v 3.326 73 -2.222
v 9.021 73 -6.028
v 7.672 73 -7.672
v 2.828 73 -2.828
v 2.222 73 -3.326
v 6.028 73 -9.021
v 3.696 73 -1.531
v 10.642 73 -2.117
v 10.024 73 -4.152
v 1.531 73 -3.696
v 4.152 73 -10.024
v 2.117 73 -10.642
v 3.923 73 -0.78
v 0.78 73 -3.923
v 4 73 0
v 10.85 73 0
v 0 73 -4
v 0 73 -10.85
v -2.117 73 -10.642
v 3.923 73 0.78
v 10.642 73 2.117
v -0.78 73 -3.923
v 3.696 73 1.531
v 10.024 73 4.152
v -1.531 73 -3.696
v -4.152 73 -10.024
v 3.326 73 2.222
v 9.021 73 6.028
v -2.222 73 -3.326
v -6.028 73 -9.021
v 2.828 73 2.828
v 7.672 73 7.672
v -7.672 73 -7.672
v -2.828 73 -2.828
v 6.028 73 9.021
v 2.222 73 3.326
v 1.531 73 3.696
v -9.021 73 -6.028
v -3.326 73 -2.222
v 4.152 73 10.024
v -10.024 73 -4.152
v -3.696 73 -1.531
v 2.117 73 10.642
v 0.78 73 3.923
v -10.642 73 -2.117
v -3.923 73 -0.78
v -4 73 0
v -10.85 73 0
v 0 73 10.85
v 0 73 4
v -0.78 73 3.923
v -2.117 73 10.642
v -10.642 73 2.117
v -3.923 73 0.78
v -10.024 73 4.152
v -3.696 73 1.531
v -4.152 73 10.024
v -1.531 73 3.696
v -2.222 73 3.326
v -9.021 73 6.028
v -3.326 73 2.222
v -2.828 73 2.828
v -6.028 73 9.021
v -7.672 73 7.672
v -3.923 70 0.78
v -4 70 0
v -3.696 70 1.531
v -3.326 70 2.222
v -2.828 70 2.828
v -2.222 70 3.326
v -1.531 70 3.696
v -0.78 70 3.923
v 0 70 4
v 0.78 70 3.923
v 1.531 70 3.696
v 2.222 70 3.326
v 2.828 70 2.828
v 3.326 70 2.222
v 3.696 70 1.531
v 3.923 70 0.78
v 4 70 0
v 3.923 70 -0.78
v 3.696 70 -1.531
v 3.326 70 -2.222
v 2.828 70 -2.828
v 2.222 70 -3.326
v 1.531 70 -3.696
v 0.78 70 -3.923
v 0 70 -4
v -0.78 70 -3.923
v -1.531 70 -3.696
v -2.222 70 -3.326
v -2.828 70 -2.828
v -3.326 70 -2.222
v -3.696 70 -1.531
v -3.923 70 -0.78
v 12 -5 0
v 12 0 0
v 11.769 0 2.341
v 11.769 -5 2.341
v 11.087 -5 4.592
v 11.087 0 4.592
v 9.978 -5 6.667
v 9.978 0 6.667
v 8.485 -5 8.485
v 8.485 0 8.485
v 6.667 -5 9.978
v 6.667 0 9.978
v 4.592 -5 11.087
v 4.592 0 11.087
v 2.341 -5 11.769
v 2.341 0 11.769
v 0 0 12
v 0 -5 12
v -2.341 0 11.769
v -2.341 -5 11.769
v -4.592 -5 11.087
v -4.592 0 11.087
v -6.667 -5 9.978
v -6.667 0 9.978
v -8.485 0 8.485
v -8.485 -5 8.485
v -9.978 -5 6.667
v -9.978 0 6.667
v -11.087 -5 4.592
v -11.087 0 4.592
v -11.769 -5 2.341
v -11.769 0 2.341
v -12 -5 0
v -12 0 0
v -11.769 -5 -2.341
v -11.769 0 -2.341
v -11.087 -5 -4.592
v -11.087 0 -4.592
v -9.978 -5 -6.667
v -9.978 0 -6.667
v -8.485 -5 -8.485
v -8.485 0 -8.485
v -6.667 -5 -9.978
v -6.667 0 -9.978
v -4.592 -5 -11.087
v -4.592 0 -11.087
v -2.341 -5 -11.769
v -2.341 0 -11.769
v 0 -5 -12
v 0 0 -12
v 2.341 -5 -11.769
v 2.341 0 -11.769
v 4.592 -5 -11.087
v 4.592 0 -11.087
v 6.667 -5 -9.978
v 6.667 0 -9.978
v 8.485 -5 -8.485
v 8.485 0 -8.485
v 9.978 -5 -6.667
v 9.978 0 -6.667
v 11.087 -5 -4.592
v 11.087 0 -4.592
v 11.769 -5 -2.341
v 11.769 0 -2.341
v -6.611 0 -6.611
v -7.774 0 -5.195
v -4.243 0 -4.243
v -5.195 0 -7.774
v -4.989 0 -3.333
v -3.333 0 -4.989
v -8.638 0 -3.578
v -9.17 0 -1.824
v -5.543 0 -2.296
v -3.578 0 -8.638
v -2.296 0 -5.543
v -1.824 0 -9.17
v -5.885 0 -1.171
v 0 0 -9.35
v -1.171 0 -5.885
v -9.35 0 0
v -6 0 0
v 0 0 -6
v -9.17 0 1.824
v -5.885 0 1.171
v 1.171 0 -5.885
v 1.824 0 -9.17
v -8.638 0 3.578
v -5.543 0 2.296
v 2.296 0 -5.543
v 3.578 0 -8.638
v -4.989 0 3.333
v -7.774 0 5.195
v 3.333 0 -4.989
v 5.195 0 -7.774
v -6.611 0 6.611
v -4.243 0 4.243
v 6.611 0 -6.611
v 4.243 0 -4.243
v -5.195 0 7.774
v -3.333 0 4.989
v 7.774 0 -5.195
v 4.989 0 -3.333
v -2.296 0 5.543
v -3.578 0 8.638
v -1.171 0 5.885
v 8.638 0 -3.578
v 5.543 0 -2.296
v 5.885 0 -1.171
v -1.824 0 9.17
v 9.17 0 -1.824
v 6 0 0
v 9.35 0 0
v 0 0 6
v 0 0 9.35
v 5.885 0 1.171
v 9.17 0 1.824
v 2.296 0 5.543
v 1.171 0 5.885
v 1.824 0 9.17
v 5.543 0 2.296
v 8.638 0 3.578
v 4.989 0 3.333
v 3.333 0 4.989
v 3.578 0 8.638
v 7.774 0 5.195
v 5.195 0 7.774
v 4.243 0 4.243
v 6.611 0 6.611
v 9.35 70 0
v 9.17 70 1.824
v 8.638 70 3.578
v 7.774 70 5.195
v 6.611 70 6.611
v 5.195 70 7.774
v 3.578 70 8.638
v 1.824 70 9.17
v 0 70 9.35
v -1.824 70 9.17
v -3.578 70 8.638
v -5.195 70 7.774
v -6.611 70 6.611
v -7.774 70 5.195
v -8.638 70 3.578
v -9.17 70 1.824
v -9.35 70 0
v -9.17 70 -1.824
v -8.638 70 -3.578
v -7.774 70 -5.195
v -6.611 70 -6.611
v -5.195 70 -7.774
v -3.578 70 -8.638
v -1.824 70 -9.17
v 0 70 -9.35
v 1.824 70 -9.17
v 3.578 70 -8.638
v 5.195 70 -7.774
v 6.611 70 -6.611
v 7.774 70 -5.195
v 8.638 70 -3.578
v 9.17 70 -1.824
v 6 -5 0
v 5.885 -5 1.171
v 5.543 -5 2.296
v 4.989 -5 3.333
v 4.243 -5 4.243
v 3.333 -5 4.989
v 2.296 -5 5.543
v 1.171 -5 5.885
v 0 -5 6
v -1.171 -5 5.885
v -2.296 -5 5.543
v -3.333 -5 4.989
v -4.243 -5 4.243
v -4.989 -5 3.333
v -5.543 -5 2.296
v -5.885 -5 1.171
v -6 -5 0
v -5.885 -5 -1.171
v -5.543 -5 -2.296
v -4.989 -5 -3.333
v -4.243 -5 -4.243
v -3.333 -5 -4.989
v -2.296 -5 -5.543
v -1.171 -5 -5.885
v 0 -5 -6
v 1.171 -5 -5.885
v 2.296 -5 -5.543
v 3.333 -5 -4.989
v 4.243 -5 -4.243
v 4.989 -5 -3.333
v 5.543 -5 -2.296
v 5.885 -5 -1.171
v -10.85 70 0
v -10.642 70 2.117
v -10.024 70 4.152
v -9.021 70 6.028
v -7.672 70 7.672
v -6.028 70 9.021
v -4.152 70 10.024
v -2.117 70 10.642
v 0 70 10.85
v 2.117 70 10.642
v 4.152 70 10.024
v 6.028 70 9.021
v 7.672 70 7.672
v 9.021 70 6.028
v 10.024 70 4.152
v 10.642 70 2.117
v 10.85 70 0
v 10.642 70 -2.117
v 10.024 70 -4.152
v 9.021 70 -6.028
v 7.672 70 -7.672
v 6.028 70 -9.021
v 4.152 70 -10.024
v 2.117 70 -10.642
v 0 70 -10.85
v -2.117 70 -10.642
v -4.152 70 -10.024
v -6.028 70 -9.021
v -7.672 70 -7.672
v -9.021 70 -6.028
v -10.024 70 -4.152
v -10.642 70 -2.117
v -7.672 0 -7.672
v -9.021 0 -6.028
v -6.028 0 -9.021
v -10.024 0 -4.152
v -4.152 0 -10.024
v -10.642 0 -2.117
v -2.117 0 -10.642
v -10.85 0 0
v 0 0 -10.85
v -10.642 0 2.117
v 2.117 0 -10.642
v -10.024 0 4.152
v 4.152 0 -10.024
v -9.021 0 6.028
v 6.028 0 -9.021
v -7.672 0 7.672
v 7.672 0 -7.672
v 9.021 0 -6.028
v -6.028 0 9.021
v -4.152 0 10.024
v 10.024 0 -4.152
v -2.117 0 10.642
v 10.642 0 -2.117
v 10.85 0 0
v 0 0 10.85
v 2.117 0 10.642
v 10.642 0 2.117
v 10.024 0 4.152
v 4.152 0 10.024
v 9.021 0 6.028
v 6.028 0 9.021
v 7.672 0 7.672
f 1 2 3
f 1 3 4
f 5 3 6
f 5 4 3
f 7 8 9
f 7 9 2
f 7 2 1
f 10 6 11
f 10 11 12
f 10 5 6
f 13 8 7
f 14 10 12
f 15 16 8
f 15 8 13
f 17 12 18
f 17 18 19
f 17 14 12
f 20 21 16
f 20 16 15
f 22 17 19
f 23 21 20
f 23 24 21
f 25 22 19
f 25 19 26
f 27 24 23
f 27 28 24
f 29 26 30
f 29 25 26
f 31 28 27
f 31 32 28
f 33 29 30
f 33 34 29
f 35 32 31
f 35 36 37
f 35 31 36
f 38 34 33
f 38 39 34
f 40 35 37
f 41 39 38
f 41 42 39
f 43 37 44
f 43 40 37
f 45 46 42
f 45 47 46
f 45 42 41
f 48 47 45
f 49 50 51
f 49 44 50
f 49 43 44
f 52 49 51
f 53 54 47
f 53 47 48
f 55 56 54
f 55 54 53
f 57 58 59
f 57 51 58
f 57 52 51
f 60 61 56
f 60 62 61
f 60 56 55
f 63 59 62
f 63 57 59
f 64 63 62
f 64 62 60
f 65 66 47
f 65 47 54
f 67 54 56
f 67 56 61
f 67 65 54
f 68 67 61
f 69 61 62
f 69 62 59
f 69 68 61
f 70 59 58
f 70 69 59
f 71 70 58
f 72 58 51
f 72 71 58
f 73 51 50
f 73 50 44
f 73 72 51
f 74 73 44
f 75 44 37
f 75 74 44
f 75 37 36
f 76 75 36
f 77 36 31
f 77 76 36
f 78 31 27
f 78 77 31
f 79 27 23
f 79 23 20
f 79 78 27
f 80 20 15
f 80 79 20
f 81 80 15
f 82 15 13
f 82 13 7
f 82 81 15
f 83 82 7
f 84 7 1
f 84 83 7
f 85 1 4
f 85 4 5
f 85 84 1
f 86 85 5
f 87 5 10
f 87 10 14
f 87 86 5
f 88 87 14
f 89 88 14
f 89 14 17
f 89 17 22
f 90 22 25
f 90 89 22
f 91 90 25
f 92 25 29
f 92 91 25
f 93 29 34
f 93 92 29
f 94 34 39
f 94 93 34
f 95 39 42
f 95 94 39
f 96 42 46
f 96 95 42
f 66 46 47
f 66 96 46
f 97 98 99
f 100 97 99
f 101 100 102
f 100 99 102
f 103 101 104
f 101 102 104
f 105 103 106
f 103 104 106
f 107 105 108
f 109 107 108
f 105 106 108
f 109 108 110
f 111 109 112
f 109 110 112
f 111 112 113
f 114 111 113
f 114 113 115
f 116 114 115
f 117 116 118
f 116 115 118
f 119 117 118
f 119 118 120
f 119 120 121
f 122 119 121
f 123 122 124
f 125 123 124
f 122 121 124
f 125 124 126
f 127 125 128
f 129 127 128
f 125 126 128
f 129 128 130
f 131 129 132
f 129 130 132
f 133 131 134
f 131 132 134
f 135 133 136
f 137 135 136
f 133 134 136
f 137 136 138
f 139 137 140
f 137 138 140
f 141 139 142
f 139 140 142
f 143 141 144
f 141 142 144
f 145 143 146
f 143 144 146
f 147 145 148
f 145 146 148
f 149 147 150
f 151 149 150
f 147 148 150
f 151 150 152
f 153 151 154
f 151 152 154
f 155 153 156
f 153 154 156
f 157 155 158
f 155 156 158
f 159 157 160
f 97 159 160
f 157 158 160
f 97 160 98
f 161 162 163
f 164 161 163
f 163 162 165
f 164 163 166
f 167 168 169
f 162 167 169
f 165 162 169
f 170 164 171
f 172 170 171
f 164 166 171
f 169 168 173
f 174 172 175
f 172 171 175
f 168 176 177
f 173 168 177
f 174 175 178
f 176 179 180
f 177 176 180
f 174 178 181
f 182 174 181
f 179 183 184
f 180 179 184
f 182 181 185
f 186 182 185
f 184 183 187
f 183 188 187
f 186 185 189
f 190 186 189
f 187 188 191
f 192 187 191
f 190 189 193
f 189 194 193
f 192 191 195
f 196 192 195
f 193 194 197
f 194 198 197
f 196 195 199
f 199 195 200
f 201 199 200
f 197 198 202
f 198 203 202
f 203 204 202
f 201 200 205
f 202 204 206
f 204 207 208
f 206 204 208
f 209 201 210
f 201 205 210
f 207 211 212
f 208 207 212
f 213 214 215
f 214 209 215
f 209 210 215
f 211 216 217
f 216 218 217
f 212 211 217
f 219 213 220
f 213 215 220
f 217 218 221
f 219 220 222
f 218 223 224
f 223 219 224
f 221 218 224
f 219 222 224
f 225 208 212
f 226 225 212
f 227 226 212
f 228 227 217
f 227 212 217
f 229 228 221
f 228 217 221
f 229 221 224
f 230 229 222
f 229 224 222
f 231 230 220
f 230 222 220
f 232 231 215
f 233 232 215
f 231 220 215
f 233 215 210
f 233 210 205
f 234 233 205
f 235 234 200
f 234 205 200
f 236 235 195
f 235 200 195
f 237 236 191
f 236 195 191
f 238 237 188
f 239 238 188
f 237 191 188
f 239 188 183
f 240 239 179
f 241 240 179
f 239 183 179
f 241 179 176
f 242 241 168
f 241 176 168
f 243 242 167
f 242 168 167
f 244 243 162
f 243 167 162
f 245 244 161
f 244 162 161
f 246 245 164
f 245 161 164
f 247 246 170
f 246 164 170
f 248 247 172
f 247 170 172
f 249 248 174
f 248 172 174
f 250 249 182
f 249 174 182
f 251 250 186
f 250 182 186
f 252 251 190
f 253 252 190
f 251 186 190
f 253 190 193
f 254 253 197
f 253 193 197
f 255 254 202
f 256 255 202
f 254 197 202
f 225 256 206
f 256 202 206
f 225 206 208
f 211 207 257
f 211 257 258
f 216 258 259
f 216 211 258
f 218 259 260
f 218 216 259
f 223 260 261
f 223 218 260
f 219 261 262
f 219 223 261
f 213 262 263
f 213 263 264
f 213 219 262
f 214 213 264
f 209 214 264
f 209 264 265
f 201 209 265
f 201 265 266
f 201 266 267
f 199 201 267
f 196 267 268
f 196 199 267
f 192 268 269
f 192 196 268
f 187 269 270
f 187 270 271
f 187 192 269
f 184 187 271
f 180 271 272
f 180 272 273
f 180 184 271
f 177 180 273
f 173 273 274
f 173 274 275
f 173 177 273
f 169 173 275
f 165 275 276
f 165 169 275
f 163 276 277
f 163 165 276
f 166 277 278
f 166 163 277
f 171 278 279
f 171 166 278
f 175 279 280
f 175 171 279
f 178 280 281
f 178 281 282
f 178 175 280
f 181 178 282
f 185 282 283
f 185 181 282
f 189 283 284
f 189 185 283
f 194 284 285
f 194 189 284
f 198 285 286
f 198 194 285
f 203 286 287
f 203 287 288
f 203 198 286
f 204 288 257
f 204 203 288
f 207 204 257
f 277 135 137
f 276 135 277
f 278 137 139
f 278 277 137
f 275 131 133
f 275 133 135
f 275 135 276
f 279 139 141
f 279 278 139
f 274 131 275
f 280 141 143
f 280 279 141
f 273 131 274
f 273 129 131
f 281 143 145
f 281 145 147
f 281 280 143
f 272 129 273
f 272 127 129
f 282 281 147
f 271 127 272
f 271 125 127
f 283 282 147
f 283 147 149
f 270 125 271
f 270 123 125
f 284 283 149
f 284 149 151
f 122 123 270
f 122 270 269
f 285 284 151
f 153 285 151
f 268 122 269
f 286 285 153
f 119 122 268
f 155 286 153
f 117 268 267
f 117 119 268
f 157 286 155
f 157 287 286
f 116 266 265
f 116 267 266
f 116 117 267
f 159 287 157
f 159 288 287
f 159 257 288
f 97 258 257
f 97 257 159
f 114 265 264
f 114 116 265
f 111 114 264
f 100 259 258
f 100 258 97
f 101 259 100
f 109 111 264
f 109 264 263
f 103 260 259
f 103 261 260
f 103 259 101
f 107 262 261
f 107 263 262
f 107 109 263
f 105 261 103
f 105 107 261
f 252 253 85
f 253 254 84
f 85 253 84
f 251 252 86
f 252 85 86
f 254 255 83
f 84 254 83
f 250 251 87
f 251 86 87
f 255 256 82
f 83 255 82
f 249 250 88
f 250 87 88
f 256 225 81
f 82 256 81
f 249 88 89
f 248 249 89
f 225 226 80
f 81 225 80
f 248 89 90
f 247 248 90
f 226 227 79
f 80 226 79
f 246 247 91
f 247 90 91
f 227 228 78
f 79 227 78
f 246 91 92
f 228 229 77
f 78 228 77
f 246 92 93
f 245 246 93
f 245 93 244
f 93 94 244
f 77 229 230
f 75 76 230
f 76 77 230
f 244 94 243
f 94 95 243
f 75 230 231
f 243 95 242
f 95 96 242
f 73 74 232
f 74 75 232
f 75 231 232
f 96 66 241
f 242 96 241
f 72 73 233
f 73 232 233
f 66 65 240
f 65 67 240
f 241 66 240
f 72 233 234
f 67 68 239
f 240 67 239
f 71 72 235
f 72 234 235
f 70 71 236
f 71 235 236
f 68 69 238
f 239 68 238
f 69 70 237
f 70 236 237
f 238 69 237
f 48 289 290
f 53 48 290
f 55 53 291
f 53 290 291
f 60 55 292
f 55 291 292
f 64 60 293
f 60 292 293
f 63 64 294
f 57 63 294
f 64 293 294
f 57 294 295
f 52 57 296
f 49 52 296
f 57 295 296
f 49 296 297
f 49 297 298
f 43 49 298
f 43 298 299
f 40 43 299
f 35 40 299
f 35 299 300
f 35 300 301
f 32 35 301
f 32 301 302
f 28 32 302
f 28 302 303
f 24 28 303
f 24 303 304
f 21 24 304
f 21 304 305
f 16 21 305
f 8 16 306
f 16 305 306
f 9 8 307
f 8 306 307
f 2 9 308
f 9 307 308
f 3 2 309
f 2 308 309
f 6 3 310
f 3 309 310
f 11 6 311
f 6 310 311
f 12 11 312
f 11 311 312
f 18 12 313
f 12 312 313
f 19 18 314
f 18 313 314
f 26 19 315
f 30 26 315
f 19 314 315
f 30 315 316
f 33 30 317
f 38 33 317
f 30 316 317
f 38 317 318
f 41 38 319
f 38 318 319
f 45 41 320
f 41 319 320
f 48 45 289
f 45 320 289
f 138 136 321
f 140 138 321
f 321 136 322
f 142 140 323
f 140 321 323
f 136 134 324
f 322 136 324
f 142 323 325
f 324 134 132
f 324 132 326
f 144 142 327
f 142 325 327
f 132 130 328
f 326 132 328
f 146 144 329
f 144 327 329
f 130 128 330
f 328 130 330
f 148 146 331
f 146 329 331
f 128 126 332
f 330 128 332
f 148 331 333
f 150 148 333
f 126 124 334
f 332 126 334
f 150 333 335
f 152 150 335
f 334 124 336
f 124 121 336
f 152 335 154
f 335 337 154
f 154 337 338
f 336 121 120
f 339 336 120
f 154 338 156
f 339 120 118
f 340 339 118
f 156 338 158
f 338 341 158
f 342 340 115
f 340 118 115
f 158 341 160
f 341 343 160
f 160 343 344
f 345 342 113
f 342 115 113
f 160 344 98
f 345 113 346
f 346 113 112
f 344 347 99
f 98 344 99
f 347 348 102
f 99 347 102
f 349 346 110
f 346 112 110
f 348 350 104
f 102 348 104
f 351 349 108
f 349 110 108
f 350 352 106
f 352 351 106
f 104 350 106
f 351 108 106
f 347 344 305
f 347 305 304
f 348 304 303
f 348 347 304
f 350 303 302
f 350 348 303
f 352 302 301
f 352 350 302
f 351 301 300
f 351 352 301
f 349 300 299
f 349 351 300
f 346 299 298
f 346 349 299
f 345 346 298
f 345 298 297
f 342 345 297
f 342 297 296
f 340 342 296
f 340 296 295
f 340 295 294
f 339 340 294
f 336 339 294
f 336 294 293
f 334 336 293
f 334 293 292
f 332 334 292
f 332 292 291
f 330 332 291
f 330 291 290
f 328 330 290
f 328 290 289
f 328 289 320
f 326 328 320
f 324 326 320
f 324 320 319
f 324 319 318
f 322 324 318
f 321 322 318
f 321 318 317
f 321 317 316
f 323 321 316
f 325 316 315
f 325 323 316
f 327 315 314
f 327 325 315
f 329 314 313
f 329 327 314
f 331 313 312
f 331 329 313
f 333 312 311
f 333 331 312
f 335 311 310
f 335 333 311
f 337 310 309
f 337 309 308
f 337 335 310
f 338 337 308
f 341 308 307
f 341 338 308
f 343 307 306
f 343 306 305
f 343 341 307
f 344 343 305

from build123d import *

# Parameters (mm, degrees)
F0_R     = 12
F0_R_2   = 10.85
F0_R_3   = 9.35
F0_R_4   = 6
F1_DEPTH = 5
F2_DEPTH = 70
F3_R     = 10.85
F3_R_2   = 4
F4_DEPTH = 3


with BuildPart() as f1:
    # F0 (on Front) → F1 (new body)
    with BuildSketch(Plane.XZ):
        Circle(F0_R)
        Circle(F0_R_2, mode=Mode.SUBTRACT)
        Circle(F0_R_2)
        Circle(F0_R_3, mode=Mode.SUBTRACT)
        Circle(F0_R_3)
        Circle(F0_R_4, mode=Mode.SUBTRACT)
    extrude(amount=F1_DEPTH)

    # F0 (on Front) → F2 (join)
    with BuildSketch(Plane.XZ):
        Circle(F0_R_2)
        Circle(F0_R_3, mode=Mode.SUBTRACT)
    extrude(amount=-F2_DEPTH)

    # F3 (on face) → F4 (join)
    with BuildSketch(Plane(origin=(0, 70, 0), x_dir=(-1, 0, 0), z_dir=(0, 1, 0))):
        Circle(F3_R)
        Circle(F3_R_2, mode=Mode.SUBTRACT)
    extrude(amount=F4_DEPTH)


solid = f1.part
